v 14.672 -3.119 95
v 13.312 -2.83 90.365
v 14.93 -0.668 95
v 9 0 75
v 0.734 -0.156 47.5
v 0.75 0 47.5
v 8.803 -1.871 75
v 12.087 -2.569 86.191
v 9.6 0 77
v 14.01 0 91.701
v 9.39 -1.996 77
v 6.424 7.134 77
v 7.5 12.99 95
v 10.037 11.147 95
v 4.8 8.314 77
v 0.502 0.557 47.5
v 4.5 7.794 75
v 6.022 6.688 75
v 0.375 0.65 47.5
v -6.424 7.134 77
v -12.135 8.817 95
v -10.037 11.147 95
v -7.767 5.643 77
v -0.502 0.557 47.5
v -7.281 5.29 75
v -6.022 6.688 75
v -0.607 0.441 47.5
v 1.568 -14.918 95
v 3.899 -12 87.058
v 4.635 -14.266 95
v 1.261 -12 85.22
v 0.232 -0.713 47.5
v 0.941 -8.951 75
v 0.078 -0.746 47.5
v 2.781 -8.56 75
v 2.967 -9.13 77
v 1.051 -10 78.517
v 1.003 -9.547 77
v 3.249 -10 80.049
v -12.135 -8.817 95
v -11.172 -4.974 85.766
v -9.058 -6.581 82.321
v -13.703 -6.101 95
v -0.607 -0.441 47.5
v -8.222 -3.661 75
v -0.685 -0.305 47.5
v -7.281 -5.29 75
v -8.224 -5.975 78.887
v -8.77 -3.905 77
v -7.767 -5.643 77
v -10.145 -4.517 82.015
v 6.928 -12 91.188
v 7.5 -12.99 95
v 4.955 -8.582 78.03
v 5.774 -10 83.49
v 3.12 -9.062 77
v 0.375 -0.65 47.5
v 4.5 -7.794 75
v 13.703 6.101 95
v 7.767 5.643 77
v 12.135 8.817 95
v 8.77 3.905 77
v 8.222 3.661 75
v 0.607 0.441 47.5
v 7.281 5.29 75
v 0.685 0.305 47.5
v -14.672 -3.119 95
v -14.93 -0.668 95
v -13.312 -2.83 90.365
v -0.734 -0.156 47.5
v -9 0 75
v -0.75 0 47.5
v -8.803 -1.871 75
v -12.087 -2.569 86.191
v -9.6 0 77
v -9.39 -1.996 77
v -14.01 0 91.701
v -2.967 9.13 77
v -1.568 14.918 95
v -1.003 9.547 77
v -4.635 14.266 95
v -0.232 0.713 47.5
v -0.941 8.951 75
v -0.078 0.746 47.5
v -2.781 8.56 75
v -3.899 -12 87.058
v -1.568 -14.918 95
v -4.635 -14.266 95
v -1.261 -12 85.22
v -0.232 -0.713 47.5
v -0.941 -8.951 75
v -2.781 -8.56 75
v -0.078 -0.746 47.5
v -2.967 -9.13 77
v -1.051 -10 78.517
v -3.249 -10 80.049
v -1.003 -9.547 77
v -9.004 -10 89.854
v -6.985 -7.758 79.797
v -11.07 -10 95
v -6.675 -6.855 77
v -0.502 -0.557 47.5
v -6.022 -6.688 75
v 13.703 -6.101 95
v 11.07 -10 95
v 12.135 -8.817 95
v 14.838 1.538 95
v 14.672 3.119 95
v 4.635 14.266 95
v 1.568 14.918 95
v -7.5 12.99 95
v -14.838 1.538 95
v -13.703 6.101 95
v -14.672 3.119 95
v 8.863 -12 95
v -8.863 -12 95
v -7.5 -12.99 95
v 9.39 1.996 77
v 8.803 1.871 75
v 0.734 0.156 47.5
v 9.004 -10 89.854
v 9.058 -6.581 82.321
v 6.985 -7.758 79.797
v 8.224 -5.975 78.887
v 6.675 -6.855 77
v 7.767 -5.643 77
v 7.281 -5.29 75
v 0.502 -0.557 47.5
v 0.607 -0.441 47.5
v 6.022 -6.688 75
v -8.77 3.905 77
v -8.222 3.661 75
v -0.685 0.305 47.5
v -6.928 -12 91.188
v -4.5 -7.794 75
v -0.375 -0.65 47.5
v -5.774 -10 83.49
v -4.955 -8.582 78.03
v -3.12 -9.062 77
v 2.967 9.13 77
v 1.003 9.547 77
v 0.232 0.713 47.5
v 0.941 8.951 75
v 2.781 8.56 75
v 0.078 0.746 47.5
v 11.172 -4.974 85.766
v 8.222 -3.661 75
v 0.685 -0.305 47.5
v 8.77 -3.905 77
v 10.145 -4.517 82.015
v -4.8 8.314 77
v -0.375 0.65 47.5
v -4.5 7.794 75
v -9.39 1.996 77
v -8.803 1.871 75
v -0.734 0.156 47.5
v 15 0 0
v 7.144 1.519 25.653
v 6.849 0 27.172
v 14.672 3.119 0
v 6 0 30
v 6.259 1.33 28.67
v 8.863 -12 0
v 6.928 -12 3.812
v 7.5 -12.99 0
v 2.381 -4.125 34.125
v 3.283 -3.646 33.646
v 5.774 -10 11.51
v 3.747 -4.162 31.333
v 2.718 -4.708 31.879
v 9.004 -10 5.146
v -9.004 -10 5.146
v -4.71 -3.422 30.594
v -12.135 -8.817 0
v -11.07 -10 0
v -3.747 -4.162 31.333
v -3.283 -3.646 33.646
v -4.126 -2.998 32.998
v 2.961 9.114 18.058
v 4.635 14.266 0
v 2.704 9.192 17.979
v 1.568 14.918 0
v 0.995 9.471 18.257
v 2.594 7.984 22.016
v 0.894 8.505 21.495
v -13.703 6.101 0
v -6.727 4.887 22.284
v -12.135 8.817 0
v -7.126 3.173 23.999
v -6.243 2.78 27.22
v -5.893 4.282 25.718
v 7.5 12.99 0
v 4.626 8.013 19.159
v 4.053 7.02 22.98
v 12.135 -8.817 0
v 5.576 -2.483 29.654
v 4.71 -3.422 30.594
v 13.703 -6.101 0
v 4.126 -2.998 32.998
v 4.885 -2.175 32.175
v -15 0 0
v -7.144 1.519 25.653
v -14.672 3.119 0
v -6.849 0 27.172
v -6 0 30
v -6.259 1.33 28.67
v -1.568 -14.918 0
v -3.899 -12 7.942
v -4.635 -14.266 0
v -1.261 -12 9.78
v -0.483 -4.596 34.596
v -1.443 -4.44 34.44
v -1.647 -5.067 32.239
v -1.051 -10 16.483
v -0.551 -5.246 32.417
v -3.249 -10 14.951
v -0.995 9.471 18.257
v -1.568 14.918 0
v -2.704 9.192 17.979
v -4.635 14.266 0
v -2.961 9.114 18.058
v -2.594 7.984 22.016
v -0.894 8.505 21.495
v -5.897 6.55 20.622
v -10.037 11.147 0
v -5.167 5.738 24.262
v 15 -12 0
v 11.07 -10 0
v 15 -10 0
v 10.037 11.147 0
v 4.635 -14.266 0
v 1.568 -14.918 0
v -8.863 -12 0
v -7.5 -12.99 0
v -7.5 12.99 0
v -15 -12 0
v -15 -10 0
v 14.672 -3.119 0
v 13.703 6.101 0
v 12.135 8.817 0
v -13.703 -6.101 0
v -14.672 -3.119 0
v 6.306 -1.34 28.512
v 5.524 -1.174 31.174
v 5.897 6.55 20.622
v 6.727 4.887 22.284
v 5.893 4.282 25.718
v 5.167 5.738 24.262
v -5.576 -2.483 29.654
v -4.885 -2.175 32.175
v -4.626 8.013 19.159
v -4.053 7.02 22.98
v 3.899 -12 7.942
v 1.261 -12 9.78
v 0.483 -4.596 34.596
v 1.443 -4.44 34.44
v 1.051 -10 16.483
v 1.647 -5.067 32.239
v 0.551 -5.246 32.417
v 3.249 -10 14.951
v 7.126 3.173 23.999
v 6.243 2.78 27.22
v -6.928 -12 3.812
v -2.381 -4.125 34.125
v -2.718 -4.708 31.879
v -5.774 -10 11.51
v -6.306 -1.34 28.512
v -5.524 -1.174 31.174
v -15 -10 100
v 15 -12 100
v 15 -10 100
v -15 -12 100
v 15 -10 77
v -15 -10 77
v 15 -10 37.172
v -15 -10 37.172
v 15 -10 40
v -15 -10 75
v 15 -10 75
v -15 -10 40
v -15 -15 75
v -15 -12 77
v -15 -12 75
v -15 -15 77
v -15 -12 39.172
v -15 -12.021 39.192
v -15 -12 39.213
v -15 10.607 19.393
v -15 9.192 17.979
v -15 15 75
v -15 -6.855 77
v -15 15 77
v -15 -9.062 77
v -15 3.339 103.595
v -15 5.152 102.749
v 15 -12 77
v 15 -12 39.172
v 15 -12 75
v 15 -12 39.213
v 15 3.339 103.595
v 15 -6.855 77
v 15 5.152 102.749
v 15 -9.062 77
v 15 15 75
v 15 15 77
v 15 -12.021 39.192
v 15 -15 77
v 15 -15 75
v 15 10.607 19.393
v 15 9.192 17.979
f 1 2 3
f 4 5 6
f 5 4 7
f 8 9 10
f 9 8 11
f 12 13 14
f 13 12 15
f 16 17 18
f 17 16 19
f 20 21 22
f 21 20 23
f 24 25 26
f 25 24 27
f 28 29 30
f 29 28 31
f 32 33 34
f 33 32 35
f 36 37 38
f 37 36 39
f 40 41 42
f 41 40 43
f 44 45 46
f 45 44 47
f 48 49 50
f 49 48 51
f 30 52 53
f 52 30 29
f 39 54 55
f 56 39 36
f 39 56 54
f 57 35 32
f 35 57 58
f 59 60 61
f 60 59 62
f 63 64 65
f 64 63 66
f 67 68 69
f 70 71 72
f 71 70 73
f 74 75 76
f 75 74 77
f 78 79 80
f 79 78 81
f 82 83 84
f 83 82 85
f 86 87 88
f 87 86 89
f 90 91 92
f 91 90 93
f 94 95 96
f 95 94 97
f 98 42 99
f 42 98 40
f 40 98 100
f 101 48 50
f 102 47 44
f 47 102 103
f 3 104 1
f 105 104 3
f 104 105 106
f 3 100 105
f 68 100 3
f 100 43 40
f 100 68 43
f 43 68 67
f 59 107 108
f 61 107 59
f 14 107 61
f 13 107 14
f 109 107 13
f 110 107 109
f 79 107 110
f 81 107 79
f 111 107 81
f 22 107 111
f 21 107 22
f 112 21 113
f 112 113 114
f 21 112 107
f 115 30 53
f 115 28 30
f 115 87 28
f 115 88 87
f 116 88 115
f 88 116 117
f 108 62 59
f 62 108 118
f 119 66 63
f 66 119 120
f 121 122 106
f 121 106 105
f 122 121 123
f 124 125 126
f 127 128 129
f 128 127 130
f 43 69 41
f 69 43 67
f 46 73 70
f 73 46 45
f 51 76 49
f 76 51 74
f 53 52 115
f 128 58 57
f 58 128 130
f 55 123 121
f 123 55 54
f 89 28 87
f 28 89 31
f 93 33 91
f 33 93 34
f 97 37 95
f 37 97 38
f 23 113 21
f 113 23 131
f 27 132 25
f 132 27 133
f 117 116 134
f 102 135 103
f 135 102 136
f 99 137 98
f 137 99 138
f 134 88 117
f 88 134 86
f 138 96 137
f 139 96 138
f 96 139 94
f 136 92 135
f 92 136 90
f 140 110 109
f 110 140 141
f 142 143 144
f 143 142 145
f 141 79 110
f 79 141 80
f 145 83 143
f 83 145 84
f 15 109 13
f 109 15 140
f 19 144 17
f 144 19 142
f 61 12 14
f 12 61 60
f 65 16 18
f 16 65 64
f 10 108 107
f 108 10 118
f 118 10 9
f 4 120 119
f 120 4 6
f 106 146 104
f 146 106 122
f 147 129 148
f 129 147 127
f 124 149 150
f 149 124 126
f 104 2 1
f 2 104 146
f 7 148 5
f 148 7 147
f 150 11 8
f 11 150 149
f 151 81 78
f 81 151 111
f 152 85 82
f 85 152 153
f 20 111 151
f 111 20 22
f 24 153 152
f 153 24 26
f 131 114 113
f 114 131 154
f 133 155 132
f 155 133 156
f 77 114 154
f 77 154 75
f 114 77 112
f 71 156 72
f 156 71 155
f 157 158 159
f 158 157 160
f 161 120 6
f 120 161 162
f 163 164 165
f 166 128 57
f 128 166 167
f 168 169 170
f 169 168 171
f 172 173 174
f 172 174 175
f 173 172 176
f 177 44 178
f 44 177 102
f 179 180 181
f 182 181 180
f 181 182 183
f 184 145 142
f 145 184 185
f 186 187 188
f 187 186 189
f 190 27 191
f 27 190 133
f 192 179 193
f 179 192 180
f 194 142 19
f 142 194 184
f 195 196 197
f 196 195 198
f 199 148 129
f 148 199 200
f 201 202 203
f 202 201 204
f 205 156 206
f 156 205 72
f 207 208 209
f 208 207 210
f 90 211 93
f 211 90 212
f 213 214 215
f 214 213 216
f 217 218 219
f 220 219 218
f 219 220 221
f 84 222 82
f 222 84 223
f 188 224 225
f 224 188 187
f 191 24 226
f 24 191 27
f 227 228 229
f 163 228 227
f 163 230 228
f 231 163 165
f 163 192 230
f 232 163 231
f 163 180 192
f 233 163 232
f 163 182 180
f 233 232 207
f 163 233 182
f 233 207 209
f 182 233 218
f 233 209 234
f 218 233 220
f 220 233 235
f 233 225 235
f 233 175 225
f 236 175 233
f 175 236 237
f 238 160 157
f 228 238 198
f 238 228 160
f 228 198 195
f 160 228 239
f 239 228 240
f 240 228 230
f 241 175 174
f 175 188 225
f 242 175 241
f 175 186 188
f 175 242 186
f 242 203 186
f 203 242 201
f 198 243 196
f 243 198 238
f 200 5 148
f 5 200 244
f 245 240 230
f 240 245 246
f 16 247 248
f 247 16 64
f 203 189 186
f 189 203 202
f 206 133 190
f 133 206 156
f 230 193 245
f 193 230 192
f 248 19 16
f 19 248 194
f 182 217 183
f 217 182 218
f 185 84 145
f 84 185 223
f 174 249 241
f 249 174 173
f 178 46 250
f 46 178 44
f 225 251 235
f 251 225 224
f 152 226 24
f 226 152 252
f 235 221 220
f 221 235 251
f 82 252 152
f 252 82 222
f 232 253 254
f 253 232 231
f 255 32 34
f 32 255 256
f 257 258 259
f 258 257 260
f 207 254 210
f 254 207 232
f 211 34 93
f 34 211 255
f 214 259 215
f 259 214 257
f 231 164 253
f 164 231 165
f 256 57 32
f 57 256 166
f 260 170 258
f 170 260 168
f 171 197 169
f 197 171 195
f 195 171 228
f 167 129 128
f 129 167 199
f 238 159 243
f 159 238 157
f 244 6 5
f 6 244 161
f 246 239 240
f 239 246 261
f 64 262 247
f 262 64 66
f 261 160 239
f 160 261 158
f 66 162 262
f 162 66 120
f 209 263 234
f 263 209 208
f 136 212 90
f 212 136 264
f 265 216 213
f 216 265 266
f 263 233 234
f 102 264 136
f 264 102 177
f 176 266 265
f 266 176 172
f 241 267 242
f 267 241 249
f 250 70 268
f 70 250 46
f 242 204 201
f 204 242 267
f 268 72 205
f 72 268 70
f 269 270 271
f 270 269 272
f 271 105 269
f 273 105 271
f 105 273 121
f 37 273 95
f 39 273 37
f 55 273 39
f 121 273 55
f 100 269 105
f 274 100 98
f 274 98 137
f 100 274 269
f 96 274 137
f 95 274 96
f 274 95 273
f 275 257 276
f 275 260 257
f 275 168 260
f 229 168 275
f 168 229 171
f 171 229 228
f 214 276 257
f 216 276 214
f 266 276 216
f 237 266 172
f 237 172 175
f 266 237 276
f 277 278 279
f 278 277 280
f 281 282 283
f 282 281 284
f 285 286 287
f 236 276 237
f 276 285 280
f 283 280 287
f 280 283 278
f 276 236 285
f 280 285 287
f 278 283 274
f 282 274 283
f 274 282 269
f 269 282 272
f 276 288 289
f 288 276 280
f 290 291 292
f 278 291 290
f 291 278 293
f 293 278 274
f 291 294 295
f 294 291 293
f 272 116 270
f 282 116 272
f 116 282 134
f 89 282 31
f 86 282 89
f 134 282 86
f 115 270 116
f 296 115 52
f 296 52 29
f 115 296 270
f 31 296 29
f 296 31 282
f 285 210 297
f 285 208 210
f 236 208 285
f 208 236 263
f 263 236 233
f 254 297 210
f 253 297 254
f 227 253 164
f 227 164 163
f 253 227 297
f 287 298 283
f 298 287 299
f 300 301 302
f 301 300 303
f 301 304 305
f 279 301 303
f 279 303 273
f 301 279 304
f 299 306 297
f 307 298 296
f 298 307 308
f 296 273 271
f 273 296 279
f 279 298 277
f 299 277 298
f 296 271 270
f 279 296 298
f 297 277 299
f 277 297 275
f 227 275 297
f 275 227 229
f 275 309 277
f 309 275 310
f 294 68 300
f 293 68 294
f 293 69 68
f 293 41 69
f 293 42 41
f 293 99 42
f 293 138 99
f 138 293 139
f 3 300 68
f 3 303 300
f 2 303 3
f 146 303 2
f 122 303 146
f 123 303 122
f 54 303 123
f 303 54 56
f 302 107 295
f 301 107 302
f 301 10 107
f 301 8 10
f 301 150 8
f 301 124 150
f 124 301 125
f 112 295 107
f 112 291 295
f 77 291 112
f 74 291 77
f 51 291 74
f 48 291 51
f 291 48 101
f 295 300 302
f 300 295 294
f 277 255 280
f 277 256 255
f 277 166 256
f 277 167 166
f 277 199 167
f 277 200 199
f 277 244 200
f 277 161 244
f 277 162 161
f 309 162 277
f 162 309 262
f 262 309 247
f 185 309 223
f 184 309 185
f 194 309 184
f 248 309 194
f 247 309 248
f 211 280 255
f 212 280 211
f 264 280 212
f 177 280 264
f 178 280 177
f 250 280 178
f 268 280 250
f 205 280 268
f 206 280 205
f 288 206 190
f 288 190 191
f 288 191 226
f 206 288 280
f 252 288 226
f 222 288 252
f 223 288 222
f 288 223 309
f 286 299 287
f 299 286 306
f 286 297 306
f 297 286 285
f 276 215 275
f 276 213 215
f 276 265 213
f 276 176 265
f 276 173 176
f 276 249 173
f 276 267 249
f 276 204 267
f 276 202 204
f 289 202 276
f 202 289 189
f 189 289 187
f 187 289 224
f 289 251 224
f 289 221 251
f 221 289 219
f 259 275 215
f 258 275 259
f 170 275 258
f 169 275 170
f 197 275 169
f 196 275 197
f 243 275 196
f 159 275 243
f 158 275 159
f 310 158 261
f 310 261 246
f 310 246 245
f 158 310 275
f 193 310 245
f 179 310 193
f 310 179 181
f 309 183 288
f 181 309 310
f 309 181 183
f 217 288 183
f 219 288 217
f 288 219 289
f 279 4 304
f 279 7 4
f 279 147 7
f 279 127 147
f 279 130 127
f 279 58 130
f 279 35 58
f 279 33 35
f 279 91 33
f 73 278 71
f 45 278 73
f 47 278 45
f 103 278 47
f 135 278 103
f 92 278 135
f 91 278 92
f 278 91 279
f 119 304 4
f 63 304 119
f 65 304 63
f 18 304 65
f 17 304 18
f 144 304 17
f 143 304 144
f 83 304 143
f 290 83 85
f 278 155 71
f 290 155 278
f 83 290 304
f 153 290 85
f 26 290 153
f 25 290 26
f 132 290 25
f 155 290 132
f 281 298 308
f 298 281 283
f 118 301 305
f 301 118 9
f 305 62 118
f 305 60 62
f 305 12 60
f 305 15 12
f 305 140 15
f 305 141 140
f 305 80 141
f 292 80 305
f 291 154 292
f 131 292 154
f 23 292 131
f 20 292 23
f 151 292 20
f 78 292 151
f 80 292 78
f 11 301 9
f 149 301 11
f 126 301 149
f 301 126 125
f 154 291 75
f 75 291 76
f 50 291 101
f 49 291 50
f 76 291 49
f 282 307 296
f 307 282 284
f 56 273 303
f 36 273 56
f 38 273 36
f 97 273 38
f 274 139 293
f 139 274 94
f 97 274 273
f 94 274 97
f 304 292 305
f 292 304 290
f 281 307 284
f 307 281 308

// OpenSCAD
module cone(x, y, z, rotx, roty,rotz)
{
    translate([x, y, z])
    {
        rotate([rotx,roty,rotz])
        cylinder( r1=15, r2=0, h=50, center = true);
    }
}

module square_m(x, y, z, rotx, roty, rotz, l, w)
{
    translate([x, y, z])
    {
        rotate([rotx, roty, rotz])
        //linear extrude just added for the requirements...
        linear_extrude(2)
        square([l, w], center=true);
    }
}

//bottom cone
module bottom_cone() cone(0, 0, 25, 0, 0, 0);


//top cone
module top_cone() cone(0, 0, 70, 180, 0, 0);


//large square that makes two hyperbolas
module hyperbola() square_m(0, -10, 50, 90, 0, 0, 30, 100);

//square that makes ellipse with bottom cone
module ellipse()
square_m(0, 0, 30, 135, 0, 0, 30, 30);


//makes circle with top cone
module circle_m()
square_m(0, 0, 75, 0, 0, 0, 30, 30);

//makes a parabola with top cone
module parabola()
square_m(0, -3, 90, -115, 0, 0, 30, 30);


top_cone();
bottom_cone();
hyperbola();
parabola();
ellipse();
circle_m();

//scale the parabola along the x,y plane
//TODO: fix so that it follows the plan

/*
scale([2, 2, 1])
{
    intersection()
    {
        top_cone();
        parabola();
    }
}

//scale the circle
scale([1.7, 1.7, 1])
{
    intersection()
    {
        top_cone();
        circle_m();
    }
}

//scale the hyperbola

scale([2, 1, 1])
{
union()
{
    intersection()
    {
        top_cone();
        hyperbola();
    }

    intersection()
    {
        bottom_cone();
        hyperbola();
    }
}
}
intersection()
{
    ellipse();
    bottom_cone();
}
*/
